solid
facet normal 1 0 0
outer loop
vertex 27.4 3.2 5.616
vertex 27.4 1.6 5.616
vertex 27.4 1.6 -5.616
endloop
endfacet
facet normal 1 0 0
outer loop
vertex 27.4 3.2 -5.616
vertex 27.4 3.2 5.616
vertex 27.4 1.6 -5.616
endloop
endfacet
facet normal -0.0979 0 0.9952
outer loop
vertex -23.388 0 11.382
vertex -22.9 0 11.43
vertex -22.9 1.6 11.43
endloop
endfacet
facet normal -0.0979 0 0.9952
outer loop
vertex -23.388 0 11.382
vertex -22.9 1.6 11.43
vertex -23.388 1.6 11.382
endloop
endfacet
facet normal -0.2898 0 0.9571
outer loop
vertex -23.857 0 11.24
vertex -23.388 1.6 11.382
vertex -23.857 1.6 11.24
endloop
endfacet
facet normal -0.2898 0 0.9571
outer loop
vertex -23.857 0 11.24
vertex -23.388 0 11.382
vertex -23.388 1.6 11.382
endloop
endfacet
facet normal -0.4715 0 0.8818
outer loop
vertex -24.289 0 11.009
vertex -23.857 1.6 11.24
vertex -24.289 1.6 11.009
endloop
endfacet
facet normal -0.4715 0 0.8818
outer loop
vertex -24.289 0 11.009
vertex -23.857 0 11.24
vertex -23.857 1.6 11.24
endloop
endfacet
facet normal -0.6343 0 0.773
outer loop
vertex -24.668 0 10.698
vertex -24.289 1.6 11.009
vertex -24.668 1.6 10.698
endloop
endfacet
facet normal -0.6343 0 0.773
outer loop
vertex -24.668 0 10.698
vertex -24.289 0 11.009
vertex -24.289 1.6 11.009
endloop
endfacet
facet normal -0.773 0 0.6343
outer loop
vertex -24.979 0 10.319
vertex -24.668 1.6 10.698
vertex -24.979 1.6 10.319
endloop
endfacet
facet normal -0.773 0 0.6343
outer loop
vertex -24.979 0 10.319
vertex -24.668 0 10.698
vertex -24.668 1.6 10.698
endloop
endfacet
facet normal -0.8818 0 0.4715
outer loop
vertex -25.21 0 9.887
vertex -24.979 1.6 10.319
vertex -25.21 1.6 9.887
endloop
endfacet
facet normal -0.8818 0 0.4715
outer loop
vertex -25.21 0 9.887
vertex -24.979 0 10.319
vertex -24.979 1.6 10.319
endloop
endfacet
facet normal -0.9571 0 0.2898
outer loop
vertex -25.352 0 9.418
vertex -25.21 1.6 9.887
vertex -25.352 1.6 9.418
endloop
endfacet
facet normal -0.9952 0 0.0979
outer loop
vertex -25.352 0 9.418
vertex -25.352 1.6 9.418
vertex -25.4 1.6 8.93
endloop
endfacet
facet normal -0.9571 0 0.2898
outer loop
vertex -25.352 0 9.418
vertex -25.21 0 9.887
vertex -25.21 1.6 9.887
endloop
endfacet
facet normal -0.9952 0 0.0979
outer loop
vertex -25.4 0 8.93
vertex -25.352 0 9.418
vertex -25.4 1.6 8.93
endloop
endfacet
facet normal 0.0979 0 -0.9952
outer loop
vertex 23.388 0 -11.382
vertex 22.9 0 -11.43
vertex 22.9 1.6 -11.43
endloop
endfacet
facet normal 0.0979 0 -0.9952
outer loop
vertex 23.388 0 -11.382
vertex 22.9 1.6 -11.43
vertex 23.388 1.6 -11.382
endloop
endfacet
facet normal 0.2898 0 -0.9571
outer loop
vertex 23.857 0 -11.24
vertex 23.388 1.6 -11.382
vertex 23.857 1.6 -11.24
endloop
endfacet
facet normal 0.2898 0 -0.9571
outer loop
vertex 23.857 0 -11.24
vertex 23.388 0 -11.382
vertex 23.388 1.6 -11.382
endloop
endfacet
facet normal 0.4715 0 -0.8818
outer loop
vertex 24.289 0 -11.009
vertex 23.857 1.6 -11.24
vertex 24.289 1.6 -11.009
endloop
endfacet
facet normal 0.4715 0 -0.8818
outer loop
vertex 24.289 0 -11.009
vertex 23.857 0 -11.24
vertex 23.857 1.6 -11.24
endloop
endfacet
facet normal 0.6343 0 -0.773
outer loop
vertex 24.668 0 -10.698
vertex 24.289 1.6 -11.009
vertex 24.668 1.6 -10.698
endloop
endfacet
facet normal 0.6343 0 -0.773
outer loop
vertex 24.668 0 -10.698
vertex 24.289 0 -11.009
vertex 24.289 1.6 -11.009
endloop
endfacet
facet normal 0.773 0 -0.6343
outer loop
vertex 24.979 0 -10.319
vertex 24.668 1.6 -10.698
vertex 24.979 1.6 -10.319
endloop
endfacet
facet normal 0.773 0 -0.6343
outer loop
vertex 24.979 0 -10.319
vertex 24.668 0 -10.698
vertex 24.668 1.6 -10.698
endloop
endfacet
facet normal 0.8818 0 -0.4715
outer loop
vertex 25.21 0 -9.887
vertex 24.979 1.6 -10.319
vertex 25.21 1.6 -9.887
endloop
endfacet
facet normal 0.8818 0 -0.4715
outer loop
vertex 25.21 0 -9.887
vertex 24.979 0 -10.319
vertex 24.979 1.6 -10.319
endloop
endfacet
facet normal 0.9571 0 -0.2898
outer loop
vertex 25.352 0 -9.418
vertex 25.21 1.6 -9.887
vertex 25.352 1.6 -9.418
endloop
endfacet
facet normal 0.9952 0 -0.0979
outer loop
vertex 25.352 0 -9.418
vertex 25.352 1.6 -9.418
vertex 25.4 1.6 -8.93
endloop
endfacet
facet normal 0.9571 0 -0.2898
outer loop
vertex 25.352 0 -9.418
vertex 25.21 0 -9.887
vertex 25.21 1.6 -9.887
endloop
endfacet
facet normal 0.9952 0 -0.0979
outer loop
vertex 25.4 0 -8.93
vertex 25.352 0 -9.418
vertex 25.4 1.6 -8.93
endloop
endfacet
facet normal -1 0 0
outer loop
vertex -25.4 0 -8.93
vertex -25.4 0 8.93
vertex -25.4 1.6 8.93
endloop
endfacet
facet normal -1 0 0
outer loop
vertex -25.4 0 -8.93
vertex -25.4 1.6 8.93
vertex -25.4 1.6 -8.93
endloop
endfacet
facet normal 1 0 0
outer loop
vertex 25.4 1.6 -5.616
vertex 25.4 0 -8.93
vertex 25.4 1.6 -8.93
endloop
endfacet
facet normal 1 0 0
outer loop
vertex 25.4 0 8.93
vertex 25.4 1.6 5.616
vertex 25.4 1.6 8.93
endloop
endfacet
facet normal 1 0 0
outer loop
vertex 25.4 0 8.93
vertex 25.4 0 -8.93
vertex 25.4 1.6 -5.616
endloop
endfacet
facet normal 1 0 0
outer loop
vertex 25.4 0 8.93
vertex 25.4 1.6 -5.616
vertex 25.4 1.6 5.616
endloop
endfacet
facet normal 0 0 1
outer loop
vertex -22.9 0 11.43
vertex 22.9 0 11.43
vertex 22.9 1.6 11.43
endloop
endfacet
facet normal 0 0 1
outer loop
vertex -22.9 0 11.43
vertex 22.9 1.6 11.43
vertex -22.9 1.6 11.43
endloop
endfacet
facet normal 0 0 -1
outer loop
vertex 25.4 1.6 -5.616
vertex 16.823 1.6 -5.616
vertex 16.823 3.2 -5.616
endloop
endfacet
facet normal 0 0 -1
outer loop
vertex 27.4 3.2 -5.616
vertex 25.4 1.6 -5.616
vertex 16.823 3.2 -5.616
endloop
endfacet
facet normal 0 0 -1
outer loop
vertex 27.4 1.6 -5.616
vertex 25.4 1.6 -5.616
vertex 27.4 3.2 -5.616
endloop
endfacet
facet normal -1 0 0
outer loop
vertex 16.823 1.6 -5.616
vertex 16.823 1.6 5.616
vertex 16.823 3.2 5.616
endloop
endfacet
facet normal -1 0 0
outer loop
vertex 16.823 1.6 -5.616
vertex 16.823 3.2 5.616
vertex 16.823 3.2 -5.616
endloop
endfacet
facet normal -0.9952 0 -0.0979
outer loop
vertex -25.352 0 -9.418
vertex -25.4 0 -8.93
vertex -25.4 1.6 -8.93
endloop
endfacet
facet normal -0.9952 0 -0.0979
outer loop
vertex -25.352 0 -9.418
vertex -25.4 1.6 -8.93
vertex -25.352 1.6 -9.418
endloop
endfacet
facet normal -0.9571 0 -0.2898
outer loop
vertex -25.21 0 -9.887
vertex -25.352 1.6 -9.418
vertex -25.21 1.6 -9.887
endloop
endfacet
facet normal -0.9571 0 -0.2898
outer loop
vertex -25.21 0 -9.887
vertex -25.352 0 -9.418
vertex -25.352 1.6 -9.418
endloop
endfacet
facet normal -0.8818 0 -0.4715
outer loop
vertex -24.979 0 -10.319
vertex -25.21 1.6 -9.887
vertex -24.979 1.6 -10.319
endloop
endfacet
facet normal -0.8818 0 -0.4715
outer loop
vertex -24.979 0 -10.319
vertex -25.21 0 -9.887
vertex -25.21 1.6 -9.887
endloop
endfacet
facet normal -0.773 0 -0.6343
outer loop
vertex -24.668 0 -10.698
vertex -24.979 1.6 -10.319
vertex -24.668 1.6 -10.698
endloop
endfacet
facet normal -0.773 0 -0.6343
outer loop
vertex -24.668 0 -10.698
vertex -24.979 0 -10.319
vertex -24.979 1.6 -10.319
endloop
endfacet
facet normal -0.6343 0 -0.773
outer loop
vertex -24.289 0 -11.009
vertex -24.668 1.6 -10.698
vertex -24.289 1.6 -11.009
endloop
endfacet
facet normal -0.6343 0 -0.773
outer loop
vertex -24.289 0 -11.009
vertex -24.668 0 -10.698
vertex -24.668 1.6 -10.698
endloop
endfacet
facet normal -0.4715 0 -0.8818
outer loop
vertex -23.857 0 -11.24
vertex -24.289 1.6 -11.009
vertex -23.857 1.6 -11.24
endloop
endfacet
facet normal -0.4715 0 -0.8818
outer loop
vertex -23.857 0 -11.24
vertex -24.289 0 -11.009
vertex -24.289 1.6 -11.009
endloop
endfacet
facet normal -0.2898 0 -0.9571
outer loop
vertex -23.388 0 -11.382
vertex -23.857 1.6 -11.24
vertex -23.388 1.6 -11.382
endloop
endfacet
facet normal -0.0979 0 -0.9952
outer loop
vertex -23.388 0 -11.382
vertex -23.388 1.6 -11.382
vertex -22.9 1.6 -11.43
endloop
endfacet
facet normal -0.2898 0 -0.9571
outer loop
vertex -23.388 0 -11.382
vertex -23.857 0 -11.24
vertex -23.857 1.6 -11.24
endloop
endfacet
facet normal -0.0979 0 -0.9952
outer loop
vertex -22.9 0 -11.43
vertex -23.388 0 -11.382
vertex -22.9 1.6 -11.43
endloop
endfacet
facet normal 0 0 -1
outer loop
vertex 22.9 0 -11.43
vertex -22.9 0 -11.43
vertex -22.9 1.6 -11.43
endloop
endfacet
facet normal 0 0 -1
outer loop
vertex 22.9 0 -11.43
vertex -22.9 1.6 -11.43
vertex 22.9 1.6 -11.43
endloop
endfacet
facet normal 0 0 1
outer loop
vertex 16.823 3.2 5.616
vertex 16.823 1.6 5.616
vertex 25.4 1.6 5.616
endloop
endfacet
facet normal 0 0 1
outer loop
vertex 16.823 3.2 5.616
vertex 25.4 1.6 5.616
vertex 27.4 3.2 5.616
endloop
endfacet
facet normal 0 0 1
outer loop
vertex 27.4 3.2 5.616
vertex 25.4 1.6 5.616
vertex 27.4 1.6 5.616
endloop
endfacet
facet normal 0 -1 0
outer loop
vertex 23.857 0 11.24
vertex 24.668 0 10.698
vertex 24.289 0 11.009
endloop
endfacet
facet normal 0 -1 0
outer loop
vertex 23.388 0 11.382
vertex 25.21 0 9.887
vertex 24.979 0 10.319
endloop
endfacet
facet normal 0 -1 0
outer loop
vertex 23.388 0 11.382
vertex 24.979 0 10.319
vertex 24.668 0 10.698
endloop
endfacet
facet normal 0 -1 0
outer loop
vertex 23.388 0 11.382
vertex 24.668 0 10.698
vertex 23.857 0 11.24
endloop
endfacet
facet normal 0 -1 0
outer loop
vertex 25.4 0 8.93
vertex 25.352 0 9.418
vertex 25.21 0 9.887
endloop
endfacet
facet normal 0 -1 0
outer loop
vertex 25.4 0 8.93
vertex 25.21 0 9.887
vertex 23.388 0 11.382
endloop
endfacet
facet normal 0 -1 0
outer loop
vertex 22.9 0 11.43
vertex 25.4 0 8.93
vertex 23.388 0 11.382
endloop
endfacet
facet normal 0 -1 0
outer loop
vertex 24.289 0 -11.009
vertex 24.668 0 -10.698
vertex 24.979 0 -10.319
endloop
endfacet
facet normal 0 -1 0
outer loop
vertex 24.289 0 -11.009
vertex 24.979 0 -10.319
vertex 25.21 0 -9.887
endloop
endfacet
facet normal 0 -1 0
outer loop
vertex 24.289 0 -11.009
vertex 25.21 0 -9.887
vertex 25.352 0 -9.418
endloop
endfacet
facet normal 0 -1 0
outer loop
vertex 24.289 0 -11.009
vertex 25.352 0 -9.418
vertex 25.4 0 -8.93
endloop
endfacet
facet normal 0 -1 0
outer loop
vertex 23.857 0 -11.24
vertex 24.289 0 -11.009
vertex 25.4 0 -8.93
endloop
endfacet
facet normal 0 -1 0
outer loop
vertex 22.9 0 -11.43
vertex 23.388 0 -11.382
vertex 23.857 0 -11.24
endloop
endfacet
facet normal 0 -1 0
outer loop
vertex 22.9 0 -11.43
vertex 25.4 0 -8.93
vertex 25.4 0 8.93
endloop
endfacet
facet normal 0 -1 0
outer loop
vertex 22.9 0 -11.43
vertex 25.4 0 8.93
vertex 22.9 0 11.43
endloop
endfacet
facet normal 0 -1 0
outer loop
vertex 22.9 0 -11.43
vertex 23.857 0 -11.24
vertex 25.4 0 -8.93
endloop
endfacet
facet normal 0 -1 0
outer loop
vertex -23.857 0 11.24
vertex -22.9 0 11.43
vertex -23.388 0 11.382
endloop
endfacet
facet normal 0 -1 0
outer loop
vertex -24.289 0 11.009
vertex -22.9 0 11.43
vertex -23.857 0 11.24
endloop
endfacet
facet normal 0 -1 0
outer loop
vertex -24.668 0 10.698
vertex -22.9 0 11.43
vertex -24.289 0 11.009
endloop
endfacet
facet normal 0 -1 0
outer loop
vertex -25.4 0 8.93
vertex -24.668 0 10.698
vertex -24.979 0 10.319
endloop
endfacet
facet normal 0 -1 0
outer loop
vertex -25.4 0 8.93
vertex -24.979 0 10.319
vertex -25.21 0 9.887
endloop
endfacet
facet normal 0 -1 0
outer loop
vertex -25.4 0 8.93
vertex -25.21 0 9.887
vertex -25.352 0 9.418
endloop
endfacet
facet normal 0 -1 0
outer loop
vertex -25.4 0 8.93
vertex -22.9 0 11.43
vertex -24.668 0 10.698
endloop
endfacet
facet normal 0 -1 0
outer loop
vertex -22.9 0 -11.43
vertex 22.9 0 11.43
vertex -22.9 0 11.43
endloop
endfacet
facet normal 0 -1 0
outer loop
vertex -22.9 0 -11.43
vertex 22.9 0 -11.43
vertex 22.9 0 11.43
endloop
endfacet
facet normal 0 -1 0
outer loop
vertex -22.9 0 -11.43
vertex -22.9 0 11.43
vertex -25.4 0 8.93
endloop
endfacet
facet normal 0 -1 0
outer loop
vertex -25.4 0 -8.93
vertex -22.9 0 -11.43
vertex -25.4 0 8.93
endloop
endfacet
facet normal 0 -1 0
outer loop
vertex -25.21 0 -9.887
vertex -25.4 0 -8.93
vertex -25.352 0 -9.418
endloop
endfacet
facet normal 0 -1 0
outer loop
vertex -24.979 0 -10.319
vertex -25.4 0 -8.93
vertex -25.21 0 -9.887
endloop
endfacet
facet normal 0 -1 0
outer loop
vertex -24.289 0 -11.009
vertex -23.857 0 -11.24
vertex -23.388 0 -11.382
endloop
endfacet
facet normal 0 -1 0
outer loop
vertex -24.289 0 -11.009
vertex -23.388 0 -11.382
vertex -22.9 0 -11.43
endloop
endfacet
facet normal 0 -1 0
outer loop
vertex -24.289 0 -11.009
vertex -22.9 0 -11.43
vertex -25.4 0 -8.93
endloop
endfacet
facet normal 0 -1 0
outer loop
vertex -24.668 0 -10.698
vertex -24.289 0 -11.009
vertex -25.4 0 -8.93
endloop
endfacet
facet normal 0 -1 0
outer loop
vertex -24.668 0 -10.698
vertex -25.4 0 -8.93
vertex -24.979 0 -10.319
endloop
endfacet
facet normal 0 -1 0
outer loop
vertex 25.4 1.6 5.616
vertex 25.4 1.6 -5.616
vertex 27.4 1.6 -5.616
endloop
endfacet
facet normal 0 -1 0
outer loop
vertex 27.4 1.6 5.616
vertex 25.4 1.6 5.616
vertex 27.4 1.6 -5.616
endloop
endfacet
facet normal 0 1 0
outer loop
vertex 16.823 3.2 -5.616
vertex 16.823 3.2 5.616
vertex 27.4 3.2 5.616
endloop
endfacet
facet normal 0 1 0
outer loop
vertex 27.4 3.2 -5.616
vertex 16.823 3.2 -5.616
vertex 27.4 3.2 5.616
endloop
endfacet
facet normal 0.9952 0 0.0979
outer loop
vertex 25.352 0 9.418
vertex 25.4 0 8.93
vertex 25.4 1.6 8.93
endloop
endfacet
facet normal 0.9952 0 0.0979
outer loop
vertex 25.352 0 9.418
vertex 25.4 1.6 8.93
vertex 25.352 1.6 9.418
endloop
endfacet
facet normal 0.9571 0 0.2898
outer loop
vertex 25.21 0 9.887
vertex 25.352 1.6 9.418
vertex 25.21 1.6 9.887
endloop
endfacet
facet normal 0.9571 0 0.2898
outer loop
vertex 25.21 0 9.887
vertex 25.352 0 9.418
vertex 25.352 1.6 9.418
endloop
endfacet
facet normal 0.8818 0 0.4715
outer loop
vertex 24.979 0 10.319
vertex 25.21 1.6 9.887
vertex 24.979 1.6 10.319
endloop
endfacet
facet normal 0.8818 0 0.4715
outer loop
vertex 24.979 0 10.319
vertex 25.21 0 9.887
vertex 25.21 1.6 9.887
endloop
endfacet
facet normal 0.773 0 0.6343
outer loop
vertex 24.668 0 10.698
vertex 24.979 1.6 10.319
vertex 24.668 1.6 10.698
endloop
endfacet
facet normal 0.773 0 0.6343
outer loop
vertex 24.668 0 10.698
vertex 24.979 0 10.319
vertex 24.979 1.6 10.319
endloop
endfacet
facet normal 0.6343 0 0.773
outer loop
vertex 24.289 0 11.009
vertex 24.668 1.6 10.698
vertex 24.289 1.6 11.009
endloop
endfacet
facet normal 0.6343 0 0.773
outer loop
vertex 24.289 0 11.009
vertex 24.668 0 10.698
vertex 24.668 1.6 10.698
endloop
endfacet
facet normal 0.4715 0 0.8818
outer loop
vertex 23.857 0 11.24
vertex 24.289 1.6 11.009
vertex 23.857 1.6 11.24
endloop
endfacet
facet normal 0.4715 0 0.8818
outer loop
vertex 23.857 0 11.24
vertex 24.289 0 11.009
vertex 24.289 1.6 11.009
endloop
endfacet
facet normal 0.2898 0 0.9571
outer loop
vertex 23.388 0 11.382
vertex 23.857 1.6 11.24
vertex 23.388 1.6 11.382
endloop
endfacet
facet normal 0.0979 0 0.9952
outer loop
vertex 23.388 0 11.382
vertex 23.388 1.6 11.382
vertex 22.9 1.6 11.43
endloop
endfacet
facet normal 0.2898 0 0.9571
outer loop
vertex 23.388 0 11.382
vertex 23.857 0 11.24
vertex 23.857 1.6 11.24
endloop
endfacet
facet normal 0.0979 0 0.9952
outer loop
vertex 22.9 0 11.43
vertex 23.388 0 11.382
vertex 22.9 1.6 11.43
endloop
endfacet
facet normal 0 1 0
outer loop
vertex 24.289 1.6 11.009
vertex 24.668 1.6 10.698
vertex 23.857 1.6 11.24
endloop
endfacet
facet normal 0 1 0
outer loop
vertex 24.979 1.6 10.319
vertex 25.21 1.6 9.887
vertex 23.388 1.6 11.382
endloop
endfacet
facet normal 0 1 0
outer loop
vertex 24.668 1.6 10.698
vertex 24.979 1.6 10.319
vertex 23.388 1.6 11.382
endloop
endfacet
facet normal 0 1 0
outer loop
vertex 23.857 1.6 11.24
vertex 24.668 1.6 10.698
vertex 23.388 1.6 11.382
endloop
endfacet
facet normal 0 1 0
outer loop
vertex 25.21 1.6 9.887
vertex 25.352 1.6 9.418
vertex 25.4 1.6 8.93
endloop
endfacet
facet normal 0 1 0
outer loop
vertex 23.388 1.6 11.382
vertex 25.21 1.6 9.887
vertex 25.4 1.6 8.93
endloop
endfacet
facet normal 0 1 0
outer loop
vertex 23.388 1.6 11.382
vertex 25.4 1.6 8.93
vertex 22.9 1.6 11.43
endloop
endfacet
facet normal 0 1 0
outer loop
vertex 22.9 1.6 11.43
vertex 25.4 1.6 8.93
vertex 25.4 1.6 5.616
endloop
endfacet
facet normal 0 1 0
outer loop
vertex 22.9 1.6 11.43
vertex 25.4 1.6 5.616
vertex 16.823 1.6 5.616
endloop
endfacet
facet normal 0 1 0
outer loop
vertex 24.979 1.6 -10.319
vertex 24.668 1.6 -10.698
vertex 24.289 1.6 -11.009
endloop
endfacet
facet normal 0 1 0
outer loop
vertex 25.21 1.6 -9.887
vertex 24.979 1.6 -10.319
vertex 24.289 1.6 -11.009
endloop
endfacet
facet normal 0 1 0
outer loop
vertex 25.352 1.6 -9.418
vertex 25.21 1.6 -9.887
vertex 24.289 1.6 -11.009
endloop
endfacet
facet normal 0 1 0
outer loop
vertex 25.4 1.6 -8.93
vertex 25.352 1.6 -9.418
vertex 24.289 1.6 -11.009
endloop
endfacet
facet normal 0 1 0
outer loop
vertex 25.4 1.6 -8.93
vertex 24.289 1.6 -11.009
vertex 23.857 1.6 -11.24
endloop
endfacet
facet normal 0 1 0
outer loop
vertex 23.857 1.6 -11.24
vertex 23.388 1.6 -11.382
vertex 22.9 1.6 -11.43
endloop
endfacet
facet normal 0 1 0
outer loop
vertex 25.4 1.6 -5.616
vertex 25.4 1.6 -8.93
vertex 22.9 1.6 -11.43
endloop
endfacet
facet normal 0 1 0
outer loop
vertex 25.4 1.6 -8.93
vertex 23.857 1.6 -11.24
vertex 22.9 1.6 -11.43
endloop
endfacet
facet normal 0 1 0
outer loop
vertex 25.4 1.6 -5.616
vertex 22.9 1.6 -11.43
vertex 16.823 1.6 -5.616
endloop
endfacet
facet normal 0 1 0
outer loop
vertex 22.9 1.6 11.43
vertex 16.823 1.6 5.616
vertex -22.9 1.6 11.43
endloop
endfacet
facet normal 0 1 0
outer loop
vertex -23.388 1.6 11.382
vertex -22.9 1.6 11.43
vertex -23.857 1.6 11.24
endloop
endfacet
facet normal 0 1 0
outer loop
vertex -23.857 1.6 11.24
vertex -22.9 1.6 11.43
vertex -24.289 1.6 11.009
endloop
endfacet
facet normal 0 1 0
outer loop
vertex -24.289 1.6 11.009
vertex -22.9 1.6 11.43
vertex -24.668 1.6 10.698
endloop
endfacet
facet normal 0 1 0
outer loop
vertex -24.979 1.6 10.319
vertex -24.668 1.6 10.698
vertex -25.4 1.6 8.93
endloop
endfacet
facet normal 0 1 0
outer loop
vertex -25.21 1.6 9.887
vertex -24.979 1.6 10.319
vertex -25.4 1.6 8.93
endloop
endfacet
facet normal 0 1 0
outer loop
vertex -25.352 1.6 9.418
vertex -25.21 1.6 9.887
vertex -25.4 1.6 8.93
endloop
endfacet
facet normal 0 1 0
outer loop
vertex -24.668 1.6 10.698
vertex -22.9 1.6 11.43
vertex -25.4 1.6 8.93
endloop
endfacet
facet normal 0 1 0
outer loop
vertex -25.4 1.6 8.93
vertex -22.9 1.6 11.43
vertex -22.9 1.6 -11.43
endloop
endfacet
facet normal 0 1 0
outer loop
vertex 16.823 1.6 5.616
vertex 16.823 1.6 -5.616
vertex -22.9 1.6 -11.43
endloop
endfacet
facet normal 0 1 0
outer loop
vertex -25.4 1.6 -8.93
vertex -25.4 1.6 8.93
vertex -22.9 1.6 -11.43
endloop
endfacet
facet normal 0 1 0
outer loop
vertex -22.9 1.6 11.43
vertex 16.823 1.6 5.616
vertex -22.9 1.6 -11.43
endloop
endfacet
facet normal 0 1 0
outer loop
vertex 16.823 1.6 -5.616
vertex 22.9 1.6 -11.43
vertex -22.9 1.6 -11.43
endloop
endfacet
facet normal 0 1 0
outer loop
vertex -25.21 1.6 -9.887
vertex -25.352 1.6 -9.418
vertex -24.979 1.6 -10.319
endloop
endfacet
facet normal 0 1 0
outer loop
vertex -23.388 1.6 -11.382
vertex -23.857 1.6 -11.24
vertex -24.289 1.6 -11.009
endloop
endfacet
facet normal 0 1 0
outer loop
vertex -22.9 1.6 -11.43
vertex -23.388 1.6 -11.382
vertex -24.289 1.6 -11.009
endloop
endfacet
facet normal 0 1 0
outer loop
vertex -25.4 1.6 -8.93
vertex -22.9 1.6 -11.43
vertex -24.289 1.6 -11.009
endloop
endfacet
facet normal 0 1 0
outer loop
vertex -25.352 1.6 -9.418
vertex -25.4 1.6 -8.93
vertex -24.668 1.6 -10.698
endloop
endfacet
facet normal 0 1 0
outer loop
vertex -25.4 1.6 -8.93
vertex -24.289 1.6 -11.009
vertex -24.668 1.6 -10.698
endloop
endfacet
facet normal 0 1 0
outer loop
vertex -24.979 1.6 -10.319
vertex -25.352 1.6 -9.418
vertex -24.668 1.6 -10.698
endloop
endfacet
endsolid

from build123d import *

# Parameters (mm, degrees)
BOSS_EXTRUDE1_DEPTH = 1.6
SKETCH2_W           = 10.577290559
SKETCH2_H           = 11.232520948
BOSS_EXTRUDE2_DEPTH = 1.6


with BuildPart() as part:
    # Sketch1 → Boss-Extrude1 (new body)
    with BuildSketch(Plane(origin=(0, 0, 0), x_dir=(1, 0, 0), z_dir=(0, 1, 0))):
        with BuildLine():
            Line((-22.9, 11.43), (22.9, 11.43))
            ThreePointArc((22.9, 11.43), (24.667766953, 10.697766953), (25.4, 8.93))
            Line((25.4, 8.93), (25.4, -8.93))
            ThreePointArc((25.4, -8.93), (24.667766953, -10.697766953), (22.9, -11.43))
            Line((22.9, -11.43), (-22.9, -11.43))
            ThreePointArc((-22.9, -11.43), (-24.667766953, -10.697766953), (-25.4, -8.93))
            Line((-25.4, -8.93), (-25.4, 8.93))
            ThreePointArc((-25.4, 8.93), (-24.667766953, 10.697766953), (-22.9, 11.43))
        make_face()
    extrude(amount=BOSS_EXTRUDE1_DEPTH)

    # Sketch2 → Boss-Extrude2 (add)
    with BuildSketch(Plane(origin=(0, 1.6, 0), x_dir=(1, 0, 0), z_dir=(0, 1, 0))):
        with Locations((22.111354721, 0)):
            Rectangle(SKETCH2_W, SKETCH2_H)
    extrude(amount=BOSS_EXTRUDE2_DEPTH)


solid = part.part
